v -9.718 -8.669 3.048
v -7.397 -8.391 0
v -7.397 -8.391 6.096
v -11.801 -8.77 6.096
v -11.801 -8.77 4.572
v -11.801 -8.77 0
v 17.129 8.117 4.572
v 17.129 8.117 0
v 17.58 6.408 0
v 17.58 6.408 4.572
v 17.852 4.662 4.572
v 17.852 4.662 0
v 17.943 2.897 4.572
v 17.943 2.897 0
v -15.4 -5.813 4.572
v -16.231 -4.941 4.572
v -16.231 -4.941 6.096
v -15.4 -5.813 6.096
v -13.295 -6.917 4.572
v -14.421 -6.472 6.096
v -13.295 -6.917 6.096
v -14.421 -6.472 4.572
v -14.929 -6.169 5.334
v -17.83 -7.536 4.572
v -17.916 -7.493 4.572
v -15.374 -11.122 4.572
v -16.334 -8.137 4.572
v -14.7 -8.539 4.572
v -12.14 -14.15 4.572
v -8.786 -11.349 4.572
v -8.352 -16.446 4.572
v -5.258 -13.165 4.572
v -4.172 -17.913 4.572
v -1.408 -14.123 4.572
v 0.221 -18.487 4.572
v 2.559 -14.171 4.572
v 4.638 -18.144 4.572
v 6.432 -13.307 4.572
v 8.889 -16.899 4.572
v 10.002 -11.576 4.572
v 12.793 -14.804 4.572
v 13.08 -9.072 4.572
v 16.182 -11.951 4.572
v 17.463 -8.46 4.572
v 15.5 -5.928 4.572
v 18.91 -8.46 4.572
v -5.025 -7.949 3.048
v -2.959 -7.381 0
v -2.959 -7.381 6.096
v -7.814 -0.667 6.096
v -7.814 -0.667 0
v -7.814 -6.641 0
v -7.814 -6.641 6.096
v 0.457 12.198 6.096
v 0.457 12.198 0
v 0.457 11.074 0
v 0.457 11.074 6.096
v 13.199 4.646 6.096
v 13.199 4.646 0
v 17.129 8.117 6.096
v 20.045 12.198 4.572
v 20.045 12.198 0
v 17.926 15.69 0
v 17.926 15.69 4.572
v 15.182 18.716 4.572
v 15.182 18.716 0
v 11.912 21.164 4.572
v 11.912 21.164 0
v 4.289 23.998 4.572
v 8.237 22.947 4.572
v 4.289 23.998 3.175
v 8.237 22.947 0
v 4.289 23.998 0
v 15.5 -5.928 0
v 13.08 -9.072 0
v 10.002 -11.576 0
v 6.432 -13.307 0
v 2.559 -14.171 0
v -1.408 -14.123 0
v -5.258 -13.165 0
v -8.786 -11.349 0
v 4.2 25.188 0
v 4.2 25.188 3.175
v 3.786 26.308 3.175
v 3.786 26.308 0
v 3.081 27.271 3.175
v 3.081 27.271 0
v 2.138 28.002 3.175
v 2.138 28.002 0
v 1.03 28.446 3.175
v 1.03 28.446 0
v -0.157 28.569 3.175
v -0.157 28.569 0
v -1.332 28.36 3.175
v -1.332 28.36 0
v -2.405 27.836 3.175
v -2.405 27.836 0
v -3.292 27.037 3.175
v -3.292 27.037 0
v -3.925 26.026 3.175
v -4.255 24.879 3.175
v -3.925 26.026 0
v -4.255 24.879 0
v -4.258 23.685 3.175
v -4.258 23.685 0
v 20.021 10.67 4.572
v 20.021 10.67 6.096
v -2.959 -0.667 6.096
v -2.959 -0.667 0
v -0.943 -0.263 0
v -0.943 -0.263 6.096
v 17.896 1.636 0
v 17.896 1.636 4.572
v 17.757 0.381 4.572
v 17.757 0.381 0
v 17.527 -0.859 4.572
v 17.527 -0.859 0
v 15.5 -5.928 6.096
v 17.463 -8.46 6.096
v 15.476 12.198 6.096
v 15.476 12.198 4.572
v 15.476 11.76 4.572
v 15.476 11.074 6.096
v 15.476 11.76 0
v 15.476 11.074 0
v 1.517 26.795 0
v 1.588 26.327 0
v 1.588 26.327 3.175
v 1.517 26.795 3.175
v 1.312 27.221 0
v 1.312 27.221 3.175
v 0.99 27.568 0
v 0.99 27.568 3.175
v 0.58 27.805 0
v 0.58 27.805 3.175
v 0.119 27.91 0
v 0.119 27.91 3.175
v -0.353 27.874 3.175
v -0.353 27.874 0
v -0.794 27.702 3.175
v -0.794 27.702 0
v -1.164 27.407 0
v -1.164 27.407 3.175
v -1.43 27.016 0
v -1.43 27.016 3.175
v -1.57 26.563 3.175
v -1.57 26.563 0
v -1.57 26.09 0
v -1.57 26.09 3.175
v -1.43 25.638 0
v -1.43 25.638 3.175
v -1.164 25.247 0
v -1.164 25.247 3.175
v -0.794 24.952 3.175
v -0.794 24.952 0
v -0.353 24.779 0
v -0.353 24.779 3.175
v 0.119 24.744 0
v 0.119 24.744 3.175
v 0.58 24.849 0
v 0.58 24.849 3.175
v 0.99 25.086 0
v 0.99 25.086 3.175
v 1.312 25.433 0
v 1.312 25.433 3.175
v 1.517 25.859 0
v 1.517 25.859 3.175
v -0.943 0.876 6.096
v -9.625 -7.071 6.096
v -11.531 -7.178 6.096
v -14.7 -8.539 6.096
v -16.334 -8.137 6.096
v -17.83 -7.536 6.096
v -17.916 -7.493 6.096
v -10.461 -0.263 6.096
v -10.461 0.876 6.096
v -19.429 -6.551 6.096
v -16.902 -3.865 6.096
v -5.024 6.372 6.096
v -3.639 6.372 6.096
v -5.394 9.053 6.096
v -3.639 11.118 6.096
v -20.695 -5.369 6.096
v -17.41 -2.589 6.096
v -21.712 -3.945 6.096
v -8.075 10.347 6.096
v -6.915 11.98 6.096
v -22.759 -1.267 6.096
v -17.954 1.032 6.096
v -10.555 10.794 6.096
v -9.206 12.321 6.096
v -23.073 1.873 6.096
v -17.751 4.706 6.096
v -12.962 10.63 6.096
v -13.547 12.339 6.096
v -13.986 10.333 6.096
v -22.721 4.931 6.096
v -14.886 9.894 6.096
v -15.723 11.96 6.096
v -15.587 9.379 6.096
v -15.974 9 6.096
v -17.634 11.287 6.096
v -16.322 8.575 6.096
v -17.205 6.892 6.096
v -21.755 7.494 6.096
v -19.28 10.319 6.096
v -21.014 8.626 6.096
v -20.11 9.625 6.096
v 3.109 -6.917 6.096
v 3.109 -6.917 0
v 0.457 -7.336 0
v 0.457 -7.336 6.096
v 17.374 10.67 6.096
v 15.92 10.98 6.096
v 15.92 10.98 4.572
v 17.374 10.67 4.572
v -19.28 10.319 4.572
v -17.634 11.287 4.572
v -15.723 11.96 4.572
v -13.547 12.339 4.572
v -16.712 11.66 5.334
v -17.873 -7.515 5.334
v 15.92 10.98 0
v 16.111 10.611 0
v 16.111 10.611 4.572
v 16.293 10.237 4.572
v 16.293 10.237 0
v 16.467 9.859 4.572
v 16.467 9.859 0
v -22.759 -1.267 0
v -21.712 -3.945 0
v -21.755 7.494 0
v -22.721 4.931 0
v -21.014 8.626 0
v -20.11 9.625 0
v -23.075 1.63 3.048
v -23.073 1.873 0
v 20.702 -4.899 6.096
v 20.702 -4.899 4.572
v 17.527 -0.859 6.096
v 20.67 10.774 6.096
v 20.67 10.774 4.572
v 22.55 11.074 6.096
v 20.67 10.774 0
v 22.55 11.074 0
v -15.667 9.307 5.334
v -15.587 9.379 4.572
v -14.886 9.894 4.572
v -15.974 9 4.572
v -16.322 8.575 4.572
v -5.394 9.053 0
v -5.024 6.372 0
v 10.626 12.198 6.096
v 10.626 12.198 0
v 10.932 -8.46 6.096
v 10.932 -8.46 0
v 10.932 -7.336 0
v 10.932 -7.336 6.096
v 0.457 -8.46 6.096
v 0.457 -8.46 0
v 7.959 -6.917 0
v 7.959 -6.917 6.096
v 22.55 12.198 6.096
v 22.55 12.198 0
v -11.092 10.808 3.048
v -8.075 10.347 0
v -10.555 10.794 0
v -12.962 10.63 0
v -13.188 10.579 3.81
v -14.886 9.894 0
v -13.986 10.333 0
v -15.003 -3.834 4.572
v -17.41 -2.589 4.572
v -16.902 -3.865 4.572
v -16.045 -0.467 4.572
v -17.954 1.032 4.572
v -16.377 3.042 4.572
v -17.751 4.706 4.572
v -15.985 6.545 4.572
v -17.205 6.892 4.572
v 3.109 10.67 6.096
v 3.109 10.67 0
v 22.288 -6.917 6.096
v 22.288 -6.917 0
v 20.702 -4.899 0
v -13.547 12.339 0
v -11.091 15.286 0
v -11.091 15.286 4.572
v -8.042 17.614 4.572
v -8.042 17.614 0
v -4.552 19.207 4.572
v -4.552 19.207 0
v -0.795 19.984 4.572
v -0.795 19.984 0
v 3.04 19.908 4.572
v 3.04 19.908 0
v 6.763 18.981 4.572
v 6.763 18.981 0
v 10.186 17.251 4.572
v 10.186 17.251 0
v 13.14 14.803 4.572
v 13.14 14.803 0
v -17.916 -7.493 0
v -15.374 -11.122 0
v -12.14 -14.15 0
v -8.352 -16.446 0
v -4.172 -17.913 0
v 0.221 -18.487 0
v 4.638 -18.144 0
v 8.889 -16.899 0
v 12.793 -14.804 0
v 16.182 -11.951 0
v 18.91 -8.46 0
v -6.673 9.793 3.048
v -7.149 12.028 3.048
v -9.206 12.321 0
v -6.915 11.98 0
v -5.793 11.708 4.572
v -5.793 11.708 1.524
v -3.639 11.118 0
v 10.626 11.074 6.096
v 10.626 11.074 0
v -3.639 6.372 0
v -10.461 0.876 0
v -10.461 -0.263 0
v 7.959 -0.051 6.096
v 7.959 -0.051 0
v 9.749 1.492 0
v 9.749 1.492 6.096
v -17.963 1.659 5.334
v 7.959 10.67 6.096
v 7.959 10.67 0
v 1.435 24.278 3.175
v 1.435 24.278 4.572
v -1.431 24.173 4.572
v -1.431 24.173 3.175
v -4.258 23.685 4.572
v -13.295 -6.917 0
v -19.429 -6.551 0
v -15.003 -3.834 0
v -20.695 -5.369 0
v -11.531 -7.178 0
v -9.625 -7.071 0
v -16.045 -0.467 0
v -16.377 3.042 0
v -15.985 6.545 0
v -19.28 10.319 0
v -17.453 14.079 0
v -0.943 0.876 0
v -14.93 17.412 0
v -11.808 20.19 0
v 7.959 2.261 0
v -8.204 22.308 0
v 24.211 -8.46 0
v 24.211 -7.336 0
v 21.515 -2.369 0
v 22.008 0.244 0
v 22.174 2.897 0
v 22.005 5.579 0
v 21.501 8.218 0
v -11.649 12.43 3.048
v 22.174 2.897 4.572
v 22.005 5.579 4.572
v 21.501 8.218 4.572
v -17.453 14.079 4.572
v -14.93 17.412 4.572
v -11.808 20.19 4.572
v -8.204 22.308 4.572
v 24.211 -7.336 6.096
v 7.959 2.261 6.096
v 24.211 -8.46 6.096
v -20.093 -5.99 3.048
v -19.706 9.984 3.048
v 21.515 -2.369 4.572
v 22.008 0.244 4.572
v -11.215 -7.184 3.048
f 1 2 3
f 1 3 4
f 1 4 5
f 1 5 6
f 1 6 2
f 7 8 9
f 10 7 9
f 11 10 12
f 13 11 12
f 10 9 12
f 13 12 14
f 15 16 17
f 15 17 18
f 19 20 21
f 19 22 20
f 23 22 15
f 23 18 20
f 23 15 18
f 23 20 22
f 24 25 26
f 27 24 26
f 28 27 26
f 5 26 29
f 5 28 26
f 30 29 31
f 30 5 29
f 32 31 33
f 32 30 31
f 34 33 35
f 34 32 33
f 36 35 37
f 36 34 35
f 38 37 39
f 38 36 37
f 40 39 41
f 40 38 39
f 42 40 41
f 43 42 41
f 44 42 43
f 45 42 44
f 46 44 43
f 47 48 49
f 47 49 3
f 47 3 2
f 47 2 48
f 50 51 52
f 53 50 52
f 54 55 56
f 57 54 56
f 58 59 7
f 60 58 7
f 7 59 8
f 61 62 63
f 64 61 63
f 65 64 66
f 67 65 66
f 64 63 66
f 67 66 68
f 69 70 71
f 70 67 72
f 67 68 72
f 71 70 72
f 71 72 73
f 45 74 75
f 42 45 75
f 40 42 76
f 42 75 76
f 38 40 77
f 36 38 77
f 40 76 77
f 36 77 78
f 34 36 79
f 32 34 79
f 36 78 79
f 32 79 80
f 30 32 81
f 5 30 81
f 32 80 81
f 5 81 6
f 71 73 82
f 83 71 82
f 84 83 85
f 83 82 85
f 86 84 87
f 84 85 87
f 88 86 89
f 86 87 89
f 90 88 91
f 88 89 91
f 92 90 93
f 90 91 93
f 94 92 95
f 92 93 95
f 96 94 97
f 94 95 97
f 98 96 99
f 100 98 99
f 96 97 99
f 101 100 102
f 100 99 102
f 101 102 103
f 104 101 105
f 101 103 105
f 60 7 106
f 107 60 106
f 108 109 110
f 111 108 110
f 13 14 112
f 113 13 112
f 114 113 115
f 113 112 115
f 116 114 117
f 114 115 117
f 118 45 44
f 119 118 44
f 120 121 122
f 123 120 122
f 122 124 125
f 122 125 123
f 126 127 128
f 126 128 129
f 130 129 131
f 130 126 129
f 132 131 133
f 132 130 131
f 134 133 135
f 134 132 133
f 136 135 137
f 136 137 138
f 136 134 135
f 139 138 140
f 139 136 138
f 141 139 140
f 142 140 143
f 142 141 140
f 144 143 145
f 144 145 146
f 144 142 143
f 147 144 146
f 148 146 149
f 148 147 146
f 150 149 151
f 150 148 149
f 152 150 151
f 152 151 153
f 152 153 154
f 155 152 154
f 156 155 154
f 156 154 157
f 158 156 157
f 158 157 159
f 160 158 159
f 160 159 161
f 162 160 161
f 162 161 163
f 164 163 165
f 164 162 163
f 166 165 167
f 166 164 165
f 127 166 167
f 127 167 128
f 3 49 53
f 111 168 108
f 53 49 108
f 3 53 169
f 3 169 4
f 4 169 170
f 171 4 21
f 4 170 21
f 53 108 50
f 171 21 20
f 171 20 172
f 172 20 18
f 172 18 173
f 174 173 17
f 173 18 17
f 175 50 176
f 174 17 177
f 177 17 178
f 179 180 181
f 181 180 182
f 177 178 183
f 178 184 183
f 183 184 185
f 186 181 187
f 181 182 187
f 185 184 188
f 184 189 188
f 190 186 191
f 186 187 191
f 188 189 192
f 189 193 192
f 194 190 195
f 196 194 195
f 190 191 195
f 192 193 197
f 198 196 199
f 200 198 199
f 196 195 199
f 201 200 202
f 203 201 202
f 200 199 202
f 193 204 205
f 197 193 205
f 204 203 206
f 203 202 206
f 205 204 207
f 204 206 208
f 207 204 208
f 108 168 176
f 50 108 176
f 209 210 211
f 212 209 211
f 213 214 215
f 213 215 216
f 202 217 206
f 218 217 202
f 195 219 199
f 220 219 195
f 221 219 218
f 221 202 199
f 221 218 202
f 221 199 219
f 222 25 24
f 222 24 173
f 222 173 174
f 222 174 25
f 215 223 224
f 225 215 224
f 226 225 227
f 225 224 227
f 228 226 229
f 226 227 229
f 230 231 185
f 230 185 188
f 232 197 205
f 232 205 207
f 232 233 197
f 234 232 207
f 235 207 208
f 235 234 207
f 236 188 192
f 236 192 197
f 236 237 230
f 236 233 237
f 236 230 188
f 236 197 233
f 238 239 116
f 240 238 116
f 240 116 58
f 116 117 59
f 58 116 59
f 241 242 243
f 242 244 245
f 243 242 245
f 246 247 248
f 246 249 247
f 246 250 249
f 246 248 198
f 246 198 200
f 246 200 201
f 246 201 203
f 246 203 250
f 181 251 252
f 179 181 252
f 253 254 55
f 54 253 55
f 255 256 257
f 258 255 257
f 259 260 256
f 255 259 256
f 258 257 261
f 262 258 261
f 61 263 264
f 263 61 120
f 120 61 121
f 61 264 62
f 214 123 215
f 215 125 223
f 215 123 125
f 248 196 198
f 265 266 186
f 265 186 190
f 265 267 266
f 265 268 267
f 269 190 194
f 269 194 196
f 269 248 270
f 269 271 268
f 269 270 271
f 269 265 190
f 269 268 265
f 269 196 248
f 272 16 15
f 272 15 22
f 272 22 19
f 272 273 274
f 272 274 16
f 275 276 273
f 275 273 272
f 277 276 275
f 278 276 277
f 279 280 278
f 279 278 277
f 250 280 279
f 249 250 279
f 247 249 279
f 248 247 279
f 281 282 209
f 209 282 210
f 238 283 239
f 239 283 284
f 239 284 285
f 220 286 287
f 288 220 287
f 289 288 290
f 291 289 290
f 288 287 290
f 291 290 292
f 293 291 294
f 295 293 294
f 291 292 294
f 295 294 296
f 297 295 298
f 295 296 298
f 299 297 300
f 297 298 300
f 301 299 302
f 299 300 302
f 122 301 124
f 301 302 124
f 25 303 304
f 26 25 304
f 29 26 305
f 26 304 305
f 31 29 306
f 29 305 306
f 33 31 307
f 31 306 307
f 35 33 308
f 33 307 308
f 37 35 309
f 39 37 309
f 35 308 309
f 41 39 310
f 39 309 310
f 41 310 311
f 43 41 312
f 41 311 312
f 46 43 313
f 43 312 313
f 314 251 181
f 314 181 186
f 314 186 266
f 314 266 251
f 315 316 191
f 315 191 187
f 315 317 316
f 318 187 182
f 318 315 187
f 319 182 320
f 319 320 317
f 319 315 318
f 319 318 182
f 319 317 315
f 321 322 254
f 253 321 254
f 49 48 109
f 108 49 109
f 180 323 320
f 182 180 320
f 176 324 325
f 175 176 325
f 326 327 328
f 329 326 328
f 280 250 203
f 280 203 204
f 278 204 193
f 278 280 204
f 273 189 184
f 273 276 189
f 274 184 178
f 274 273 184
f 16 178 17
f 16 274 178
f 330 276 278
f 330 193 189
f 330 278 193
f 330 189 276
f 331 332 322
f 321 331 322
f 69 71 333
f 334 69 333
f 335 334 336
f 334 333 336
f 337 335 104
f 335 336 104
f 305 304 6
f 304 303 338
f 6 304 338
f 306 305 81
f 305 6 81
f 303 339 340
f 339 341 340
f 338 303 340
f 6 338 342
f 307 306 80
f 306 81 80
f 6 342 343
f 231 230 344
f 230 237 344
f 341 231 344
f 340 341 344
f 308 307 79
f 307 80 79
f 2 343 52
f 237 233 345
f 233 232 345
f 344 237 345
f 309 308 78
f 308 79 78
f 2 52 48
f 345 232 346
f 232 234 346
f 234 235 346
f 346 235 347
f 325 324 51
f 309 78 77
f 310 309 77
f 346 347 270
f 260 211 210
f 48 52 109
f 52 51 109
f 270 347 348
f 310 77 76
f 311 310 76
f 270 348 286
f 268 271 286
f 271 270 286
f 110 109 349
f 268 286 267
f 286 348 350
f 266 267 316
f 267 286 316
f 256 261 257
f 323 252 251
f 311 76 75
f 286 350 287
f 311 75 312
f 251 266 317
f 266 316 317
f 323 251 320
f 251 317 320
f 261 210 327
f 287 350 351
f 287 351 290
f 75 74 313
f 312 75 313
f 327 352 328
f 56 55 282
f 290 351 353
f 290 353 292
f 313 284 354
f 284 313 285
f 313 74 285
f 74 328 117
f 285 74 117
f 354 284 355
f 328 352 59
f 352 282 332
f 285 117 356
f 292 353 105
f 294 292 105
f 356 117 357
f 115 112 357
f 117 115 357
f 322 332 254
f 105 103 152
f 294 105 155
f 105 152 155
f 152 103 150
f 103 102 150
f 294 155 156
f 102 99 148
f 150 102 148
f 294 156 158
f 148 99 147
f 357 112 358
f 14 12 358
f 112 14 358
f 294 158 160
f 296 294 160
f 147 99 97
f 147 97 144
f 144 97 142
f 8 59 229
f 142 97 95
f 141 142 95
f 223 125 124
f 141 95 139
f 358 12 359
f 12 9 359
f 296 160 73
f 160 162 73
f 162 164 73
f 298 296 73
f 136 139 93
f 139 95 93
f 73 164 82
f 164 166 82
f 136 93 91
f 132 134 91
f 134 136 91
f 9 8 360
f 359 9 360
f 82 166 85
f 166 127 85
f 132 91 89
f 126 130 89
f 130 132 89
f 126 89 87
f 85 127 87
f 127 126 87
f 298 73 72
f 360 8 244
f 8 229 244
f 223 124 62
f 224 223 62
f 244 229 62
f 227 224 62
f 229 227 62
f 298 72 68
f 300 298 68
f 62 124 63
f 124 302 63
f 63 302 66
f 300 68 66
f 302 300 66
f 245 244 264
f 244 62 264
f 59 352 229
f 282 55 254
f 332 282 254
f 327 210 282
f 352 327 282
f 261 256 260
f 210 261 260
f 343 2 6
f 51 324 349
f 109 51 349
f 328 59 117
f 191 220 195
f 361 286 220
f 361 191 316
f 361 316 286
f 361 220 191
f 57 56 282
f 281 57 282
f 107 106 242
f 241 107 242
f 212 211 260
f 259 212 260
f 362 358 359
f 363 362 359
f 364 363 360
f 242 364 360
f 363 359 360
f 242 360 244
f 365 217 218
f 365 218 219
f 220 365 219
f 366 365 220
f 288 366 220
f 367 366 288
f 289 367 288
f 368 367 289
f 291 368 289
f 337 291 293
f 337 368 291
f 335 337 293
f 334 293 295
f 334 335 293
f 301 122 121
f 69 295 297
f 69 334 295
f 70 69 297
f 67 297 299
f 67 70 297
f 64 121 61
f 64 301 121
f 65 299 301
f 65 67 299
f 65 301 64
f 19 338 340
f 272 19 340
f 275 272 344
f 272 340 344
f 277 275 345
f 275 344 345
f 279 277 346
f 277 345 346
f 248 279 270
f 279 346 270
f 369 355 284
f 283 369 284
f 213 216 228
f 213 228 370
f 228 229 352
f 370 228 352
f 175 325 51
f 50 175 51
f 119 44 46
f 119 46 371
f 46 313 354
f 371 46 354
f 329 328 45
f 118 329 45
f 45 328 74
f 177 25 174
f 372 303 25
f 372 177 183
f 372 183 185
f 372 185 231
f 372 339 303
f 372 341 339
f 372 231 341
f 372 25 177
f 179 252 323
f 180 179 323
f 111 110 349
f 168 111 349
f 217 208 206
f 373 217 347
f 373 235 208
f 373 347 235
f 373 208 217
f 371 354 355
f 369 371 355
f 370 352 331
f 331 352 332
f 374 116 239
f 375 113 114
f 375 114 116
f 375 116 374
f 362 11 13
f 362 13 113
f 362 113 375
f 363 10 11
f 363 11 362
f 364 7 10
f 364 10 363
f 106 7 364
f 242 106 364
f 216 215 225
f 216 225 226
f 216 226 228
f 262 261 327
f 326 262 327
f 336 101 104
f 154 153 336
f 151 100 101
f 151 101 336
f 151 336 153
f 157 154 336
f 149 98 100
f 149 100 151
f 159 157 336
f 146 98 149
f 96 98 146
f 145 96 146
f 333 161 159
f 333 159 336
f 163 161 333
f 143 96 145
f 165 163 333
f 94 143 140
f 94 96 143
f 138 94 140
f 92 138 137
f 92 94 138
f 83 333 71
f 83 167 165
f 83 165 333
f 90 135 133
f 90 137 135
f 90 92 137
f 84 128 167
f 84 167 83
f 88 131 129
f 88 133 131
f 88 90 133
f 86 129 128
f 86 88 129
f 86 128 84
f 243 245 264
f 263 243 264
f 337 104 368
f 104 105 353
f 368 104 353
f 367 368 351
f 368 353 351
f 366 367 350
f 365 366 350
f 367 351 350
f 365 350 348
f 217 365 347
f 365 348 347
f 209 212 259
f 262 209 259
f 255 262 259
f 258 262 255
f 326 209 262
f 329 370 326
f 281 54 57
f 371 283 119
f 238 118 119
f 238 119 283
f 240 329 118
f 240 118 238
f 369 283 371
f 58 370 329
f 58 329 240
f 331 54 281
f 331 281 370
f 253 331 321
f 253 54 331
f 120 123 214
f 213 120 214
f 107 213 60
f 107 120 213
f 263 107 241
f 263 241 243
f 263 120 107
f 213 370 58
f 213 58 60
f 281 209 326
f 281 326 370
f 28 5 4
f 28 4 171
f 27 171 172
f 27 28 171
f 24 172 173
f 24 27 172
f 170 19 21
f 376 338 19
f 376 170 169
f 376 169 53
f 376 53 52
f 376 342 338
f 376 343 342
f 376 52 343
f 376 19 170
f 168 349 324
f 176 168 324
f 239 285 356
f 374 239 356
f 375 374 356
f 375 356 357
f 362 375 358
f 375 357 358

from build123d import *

# Parameters (mm, degrees)
F1_DEPTH = 6.096
F2_DEPTH = 4.572
F0_R     = 1.5875
F3_DEPTH = 3.175


with BuildPart() as f1:
    # F0 (on Top) → F1 (new body)
    with BuildSketch(Plane.XY):
        with BuildLine():
            Line((13.1990751617, 4.6464640634), (17.129461098, 8.1167903742))
            ThreePointArc((17.129461098, 8.1167903742), (16.8217445929, 8.9971059692), (16.4666606544, 9.8594054479))
            Line((16.4666606544, 9.8594054479), (7.9593701355, 2.2607470054))
            Line((7.9593701355, 2.2607470054), (7.9593701355, 10.6699067182))
            Line((7.9593701355, 10.6699067182), (10.6260497396, 11.0740984512))
            Line((10.6260497396, 11.0740984512), (10.6260497396, 12.1979486355))
            Line((10.6260497396, 12.1979486355), (0.4571772382, 12.1979486355))
            Line((0.4571772382, 12.1979486355), (0.4571772382, 11.0740984512))
            Line((0.4571772382, 11.0740984512), (3.1090693399, 10.6699067182))
            Line((3.1090693399, 10.6699067182), (3.1090693399, -6.9173628335))
            Line((3.1090693399, -6.9173628335), (0.4571772382, -7.3363420689))
            Line((0.4571772382, -7.3363420689), (0.4571772382, -8.4601922533))
            Line((0.4571772382, -8.4601922533), (10.9316581231, -8.4601922533))
            Line((10.9316581231, -8.4601922533), (10.9316581231, -7.3363420689))
            Line((10.9316581231, -7.3363420689), (7.9593701355, -6.9173628335))
            Line((7.9593701355, -6.9173628335), (7.9593701355, -0.0510325405))
            Line((7.9593701355, -0.0510325405), (9.748657929, 1.4917968793))
            Line((9.748657929, 1.4917968793), (15.4999066991, -5.927865272))
            ThreePointArc((15.4999066991, -5.927865272), (16.7161227426, -3.4746609665), (17.5266633254, -0.8592419192))
            Line((17.5266633254, -0.8592419192), (13.1990751617, 4.6464640634))
        make_face()
        with BuildLine():
            ThreePointArc((16.4666606544, 9.8594054479), (16.8217445929, 8.9971059692), (17.129461098, 8.1167903742))
            Line((17.129461098, 8.1167903742), (20.0210429475, 10.6699067182))
            Line((20.0210429475, 10.6699067182), (20.6703936904, 10.7737015738))
            ThreePointArc((20.6703936904, 10.7737015738), (20.3708801374, 11.4915066696), (20.0454692082, 12.1979486355))
            Line((20.0454692082, 12.1979486355), (15.4763505353, 12.1979486355))
            Line((15.4763505353, 12.1979486355), (15.4763505353, 11.7602529477))
            ThreePointArc((15.4763505353, 11.7602529477), (15.7031816224, 11.3728515682), (15.9198012697, 10.9796492038))
            Line((15.9198012697, 10.9796492038), (17.3740800133, 10.6699067182))
            Line((17.3740800133, 10.6699067182), (16.4666606544, 9.8594054479))
        make_face()
        with BuildLine():
            ThreePointArc((20.0454692082, 12.1979486355), (20.3708801374, 11.4915066696), (20.6703936904, 10.7737015738))
            Line((20.6703936904, 10.7737015738), (22.5497058623, 11.0740984512))
            Line((22.5497058623, 11.0740984512), (22.5497058623, 12.1979486355))
            Line((22.5497058623, 12.1979486355), (20.0454692082, 12.1979486355))
        make_face()
        with BuildLine():
            Line((20.7023127689, -4.8994119814), (17.5266633254, -0.8592419192))
            ThreePointArc((17.5266633254, -0.8592419192), (16.7161227426, -3.4746609665), (15.4999066991, -5.927865272))
            Line((15.4999066991, -5.927865272), (17.4628050278, -8.4601922533))
            Line((17.4628050278, -8.4601922533), (18.9098256888, -8.4601922533))
            ThreePointArc((18.9098256888, -8.4601922533), (19.8891997575, -6.7216497988), (20.7023127689, -4.8994119814))
        make_face()
        with BuildLine():
            Line((22.2884599861, -6.9173628335), (20.7023127689, -4.8994119814))
            ThreePointArc((20.7023127689, -4.8994119814), (19.8891997575, -6.7216497988), (18.9098256888, -8.4601922533))
            Line((18.9098256888, -8.4601922533), (24.2108353014, -8.4601922533))
            Line((24.2108353014, -8.4601922533), (24.2108353014, -7.3363420689))
            Line((24.2108353014, -7.3363420689), (22.2884599861, -6.9173628335))
        make_face()
        with BuildLine():
            Line((15.4763505353, 11.0740984512), (15.9198012697, 10.9796492038))
            ThreePointArc((15.9198012697, 10.9796492038), (15.7031816224, 11.3728515682), (15.4763505353, 11.7602529477))
            Line((15.4763505353, 11.7602529477), (15.4763505353, 11.0740984512))
        make_face()
    extrude(amount=F1_DEPTH)



with BuildPart() as f1b:
    # F0 (on Top) → F1, piece 2 (new body)
    with BuildSketch(Plane.XY):
        with BuildLine():
            add(Edge.make_bspline(
                [(-13.5465420725, 12.3386346598), (-12.6387551901, 12.4296195068), (-11.6488580811, 12.4296195068)],
                knots=[0.819888429, 0.819888429, 0.819888429, 1, 1, 1], degree=2))
            ThreePointArc((-13.5465420725, 12.3386346598), (-14.2660777227, 11.1436447733), (-14.8861798945, 9.8941626097))
            add(Edge.make_bspline(
                [(-11.0918621563, 10.8079234075), (-13.3874045962, 10.8079234075), (-14.8861798945, 9.8941626097)],
                knots=[0, 0, 0, 0.6397059246, 0.6397059246, 0.6397059246], degree=2))
            add(Edge.make_bspline(
                [(-8.0752116615, 10.3470462486), (-9.5391744016, 10.8079234075), (-11.0918621563, 10.8079234075)],
                knots=[0, 0, 0, 1, 1, 1], degree=2))
            add(Edge.make_bspline(
                [(-5.393744555, 9.0531397863), (-6.6112489213, 9.8861690896), (-8.0752116615, 10.3470462486)],
                knots=[0, 0, 0, 1, 1, 1], degree=2))
            Line((-5.393744555, 9.0531397863), (-5.0240569943, 6.3716726798))
            Line((-5.0240569943, 6.3716726798), (-3.6389609338, 6.3716726798))
            Line((-3.6389609338, 6.3716726798), (-3.6389609338, 11.1184609584))
            add(Edge.make_bspline(
                [(-7.1485281761, 12.0278923576), (-6.1922696859, 11.8430485773), (-3.6389609338, 11.1184609584)],
                knots=[0, 0, 0, 1, 1, 1], degree=2))
            add(Edge.make_bspline(
                [(-9.2064555971, 12.3211778224), (-8.1047866663, 12.2127361379), (-7.1485281761, 12.0278923576)],
                knots=[0, 0, 0, 1, 1, 1], degree=2))
            add(Edge.make_bspline(
                [(-11.6488580811, 12.4296195068), (-10.3081245278, 12.4296195068), (-9.2064555971, 12.3211778224)],
                knots=[0, 0, 0, 1, 1, 1], degree=2))
        make_face()
        with BuildLine():
            ThreePointArc((-13.2947500331, -6.9168666563), (-12.5802923039, -7.8694978593), (-11.801489684, -8.7702878097))
            add(Edge.make_bspline(
                [(-7.3974511336, -8.3911839086), (-9.8374422228, -8.7577776918), (-11.801489684, -8.7702878097)],
                knots=[0, 0, 0, 0.9658747135, 0.9658747135, 0.9658747135], degree=2))
            add(Edge.make_bspline(
                [(-2.9587358222, -7.3807045762), (-4.8712528026, -8.011638013), (-7.3974511336, -8.3911839086)],
                knots=[0, 0, 0, 1, 1, 1], degree=2))
            Line((-2.9587358222, -7.3807045762), (-2.9587358222, -0.6671784749))
            Line((-2.9587358222, -0.6671784749), (-0.9427063248, -0.2629867419))
            Line((-0.9427063248, -0.2629867419), (-0.9427063248, 0.8756509448))
            Line((-0.9427063248, 0.8756509448), (-10.4609287195, 0.8756509448))
            Line((-10.4609287195, 0.8756509448), (-10.4609287195, -0.2629867419))
            Line((-10.4609287195, -0.2629867419), (-7.8139657853, -0.6671784749))
            Line((-7.8139657853, -0.6671784749), (-7.8139657853, -6.6413294549))
            add(Edge.make_bspline(
                [(-11.2150913432, -7.1835378772), (-9.4307327172, -7.1835378772), (-7.8139657853, -6.6413294549)],
                knots=[0, 0, 0, 1, 1, 1], degree=2))
            add(Edge.make_bspline(
                [(-13.2947500331, -6.9168666563), (-12.3470834343, -7.1835378772), (-11.2150913432, -7.1835378772)],
                knots=[0.6551775055, 0.6551775055, 0.6551775055, 1, 1, 1], degree=2))
        make_face()
        with BuildLine():
            add(Edge.make_bspline(
                [(-11.801489684, -8.7702878097), (-11.8708813778, -8.7707298042), (-11.9396789621, -8.7707298042)],
                knots=[0.9658747135, 0.9658747135, 0.9658747135, 1, 1, 1], degree=2))
            ThreePointArc((-11.801489684, -8.7702878097), (-12.5802923039, -7.8694978593), (-13.2947500331, -6.9168666563))
            add(Edge.make_bspline(
                [(-16.2305192493, -4.940766676), (-15.095357152, -6.4101799171), (-13.2947500331, -6.9168666563)],
                knots=[0, 0, 0, 0.6551775055, 0.6551775055, 0.6551775055], degree=2))
            add(Edge.make_bspline(
                [(-17.9631216169, 1.6593885734), (-17.9631216169, -2.6979954747), (-16.2305192493, -4.940766676)],
                knots=[0, 0, 0, 1, 1, 1], degree=2))
            add(Edge.make_bspline(
                [(-16.3217088476, 8.5750105412), (-17.9631216169, 6.3420976749), (-17.9631216169, 1.6593885734)],
                knots=[0, 0, 0, 1, 1, 1], degree=2))
            add(Edge.make_bspline(
                [(-14.8861798945, 9.8941626097), (-15.7303175515, 9.3795158179), (-16.3217088476, 8.5750105412)],
                knots=[0.6397059246, 0.6397059246, 0.6397059246, 1, 1, 1], degree=2))
            ThreePointArc((-14.8861798945, 9.8941626097), (-14.2660777227, 11.1436447733), (-13.5465420725, 12.3386346598))
            add(Edge.make_bspline(
                [(-19.2795180694, 10.3190176516), (-17.0109804199, 11.9914040496), (-13.5465420725, 12.3386346598)],
                knots=[0.1325184685, 0.1325184685, 0.1325184685, 0.819888429, 0.819888429, 0.819888429], degree=2))
            ThreePointArc((-19.2795180694, 10.3190176516), (-20.5461171043, 1.2635766126), (-17.9156975267, -7.4934878711))
            add(Edge.make_bspline(
                [(-17.830034095, -7.5359733517), (-17.8730342479, -7.5148940204), (-17.9156975267, -7.4934878711)],
                knots=[0, 0, 0, 0.017071651, 0.017071651, 0.017071651], degree=2))
            add(Edge.make_bspline(
                [(-11.9396789621, -8.7707298042), (-15.3112295152, -8.7707298042), (-17.830034095, -7.5359733517)],
                knots=[0, 0, 0, 1, 1, 1], degree=2))
        make_face()
        with BuildLine():
            add(Edge.make_bspline(
                [(-17.9156975267, -7.4934878711), (-20.3721058809, -6.2609936642), (-21.7117534818, -3.945074846)],
                knots=[0.017071651, 0.017071651, 0.017071651, 1, 1, 1], degree=2))
            ThreePointArc((-17.9156975267, -7.4934878711), (-20.5461171043, 1.2635766126), (-19.2795180694, 10.3190176516))
            add(Edge.make_bspline(
                [(-20.1097740523, 9.6249232134), (-19.7168708088, 9.9965972709), (-19.2795180694, 10.3190176516)],
                knots=[0, 0, 0, 0.1325184685, 0.1325184685, 0.1325184685], degree=2))
            add(Edge.make_bspline(
                [(-23.0746682887, 1.6298135686), (-23.0746682887, 6.82022692), (-20.1097740523, 9.6249232134)],
                knots=[0, 0, 0, 1, 1, 1], degree=2))
            add(Edge.make_bspline(
                [(-21.7117534818, -3.945074846), (-23.0746682887, -1.5889327928), (-23.0746682887, 1.6298135686)],
                knots=[0, 0, 0, 1, 1, 1], degree=2))
        make_face()
    extrude(amount=F1_DEPTH)


with BuildPart() as f1_1:
    add(f1.part)

    add(f1b.part)  # F2 merges F1b
    # F0 (on Top) → F2 (join)
    with BuildSketch(Plane.XY):
        with BuildLine():
            ThreePointArc((-13.5465420725, 12.3386346598), (1.1244113714, 20.0534288841), (15.4763505353, 11.7602529477))
            Line((15.4763505353, 11.7602529477), (15.4763505353, 12.1979486355))
            Line((15.4763505353, 12.1979486355), (20.0454692082, 12.1979486355))
            ThreePointArc((20.0454692082, 12.1979486355), (13.6054197321, 20.0182214035), (4.2892900104, 23.9982503516))
            ThreePointArc((4.2892900104, 23.9982503516), (0, 24.2733374292), (-4.2576981592, 23.685384983))
            ThreePointArc((-4.2576981592, 23.685384983), (-13.4370376563, 18.8772693512), (-19.2795180694, 10.3190176516))
            add(Edge.make_bspline(
                [(-19.2795180694, 10.3190176516), (-17.0109804199, 11.9914040496), (-13.5465420725, 12.3386346598)],
                knots=[0.1325184685, 0.1325184685, 0.1325184685, 0.819888429, 0.819888429, 0.819888429], degree=2))
        make_face()
        with BuildLine():
            add(Edge.make_bspline(
                [(-16.2305192493, -4.940766676), (-15.095357152, -6.4101799171), (-13.2947500331, -6.9168666563)],
                knots=[0, 0, 0, 0.6551775055, 0.6551775055, 0.6551775055], degree=2))
            ThreePointArc((-13.2947500331, -6.9168666563), (-16.3013447934, 1.2793532259), (-14.8861798945, 9.8941626097))
            add(Edge.make_bspline(
                [(-14.8861798945, 9.8941626097), (-15.7303175515, 9.3795158179), (-16.3217088476, 8.5750105412)],
                knots=[0.6397059246, 0.6397059246, 0.6397059246, 1, 1, 1], degree=2))
            add(Edge.make_bspline(
                [(-16.3217088476, 8.5750105412), (-17.9631216169, 6.3420976749), (-17.9631216169, 1.6593885734)],
                knots=[0, 0, 0, 1, 1, 1], degree=2))
            add(Edge.make_bspline(
                [(-17.9631216169, 1.6593885734), (-17.9631216169, -2.6979954747), (-16.2305192493, -4.940766676)],
                knots=[0, 0, 0, 1, 1, 1], degree=2))
        make_face()
        with BuildLine():
            Line((17.4628050278, -8.4601922533), (15.4999066991, -5.927865272))
            ThreePointArc((15.4999066991, -5.927865272), (2.5594951508, -14.1713617347), (-11.801489684, -8.7702878097))
            add(Edge.make_bspline(
                [(-11.801489684, -8.7702878097), (-11.8708813778, -8.7707298042), (-11.9396789621, -8.7707298042)],
                knots=[0.9658747135, 0.9658747135, 0.9658747135, 1, 1, 1], degree=2))
            add(Edge.make_bspline(
                [(-11.9396789621, -8.7707298042), (-15.3112295152, -8.7707298042), (-17.830034095, -7.5359733517)],
                knots=[0, 0, 0, 1, 1, 1], degree=2))
            add(Edge.make_bspline(
                [(-17.830034095, -7.5359733517), (-17.8730342479, -7.5148940204), (-17.9156975267, -7.4934878711)],
                knots=[0, 0, 0, 0.017071651, 0.017071651, 0.017071651], degree=2))
            ThreePointArc((-17.9156975267, -7.4934878711), (0.2211607621, -18.4870686939), (18.9098256888, -8.4601922533))
            Line((18.9098256888, -8.4601922533), (17.4628050278, -8.4601922533))
        make_face()
        with BuildLine():
            ThreePointArc((17.129461098, 8.1167903742), (17.7381923934, 5.5381853901), (17.9427280894, 2.8966096097))
            ThreePointArc((17.9427280894, 2.8966096097), (17.8383947275, 1.0071963016), (17.5266633254, -0.8592419192))
            Line((17.5266633254, -0.8592419192), (20.7023127689, -4.8994119814))
            ThreePointArc((20.7023127689, -4.8994119814), (21.8025208752, -1.0702053402), (22.173547196, 2.8966096097))
            ThreePointArc((22.173547196, 2.8966096097), (21.7943986847, 6.9062245623), (20.6703936904, 10.7737015738))
            Line((20.6703936904, 10.7737015738), (20.0210429475, 10.6699067182))
            Line((20.0210429475, 10.6699067182), (17.129461098, 8.1167903742))
        make_face()
        with BuildLine():
            ThreePointArc((15.9198012697, 10.9796492038), (16.2034067616, 10.424494755), (16.4666606544, 9.8594054479))
            Line((16.4666606544, 9.8594054479), (17.3740800133, 10.6699067182))
            Line((17.3740800133, 10.6699067182), (15.9198012697, 10.9796492038))
        make_face()
    extrude(amount=F2_DEPTH)

    # F0 (on Top) → F3 (join)
    with BuildSketch(Plane.XY):
        with BuildLine():
            ThreePointArc((-4.2576981592, 23.685384983), (0, 24.2733374292), (4.2892900104, 23.9982503516))
            ThreePointArc((4.2892900104, 23.9982503516), (-0.1572281654, 28.5685628013), (-4.2576981592, 23.685384983))
        make_face()
        with Locations((0, 26.3267960399)):
            Circle(F0_R, mode=Mode.SUBTRACT)
    extrude(amount=F3_DEPTH)


solid = f1_1.part
